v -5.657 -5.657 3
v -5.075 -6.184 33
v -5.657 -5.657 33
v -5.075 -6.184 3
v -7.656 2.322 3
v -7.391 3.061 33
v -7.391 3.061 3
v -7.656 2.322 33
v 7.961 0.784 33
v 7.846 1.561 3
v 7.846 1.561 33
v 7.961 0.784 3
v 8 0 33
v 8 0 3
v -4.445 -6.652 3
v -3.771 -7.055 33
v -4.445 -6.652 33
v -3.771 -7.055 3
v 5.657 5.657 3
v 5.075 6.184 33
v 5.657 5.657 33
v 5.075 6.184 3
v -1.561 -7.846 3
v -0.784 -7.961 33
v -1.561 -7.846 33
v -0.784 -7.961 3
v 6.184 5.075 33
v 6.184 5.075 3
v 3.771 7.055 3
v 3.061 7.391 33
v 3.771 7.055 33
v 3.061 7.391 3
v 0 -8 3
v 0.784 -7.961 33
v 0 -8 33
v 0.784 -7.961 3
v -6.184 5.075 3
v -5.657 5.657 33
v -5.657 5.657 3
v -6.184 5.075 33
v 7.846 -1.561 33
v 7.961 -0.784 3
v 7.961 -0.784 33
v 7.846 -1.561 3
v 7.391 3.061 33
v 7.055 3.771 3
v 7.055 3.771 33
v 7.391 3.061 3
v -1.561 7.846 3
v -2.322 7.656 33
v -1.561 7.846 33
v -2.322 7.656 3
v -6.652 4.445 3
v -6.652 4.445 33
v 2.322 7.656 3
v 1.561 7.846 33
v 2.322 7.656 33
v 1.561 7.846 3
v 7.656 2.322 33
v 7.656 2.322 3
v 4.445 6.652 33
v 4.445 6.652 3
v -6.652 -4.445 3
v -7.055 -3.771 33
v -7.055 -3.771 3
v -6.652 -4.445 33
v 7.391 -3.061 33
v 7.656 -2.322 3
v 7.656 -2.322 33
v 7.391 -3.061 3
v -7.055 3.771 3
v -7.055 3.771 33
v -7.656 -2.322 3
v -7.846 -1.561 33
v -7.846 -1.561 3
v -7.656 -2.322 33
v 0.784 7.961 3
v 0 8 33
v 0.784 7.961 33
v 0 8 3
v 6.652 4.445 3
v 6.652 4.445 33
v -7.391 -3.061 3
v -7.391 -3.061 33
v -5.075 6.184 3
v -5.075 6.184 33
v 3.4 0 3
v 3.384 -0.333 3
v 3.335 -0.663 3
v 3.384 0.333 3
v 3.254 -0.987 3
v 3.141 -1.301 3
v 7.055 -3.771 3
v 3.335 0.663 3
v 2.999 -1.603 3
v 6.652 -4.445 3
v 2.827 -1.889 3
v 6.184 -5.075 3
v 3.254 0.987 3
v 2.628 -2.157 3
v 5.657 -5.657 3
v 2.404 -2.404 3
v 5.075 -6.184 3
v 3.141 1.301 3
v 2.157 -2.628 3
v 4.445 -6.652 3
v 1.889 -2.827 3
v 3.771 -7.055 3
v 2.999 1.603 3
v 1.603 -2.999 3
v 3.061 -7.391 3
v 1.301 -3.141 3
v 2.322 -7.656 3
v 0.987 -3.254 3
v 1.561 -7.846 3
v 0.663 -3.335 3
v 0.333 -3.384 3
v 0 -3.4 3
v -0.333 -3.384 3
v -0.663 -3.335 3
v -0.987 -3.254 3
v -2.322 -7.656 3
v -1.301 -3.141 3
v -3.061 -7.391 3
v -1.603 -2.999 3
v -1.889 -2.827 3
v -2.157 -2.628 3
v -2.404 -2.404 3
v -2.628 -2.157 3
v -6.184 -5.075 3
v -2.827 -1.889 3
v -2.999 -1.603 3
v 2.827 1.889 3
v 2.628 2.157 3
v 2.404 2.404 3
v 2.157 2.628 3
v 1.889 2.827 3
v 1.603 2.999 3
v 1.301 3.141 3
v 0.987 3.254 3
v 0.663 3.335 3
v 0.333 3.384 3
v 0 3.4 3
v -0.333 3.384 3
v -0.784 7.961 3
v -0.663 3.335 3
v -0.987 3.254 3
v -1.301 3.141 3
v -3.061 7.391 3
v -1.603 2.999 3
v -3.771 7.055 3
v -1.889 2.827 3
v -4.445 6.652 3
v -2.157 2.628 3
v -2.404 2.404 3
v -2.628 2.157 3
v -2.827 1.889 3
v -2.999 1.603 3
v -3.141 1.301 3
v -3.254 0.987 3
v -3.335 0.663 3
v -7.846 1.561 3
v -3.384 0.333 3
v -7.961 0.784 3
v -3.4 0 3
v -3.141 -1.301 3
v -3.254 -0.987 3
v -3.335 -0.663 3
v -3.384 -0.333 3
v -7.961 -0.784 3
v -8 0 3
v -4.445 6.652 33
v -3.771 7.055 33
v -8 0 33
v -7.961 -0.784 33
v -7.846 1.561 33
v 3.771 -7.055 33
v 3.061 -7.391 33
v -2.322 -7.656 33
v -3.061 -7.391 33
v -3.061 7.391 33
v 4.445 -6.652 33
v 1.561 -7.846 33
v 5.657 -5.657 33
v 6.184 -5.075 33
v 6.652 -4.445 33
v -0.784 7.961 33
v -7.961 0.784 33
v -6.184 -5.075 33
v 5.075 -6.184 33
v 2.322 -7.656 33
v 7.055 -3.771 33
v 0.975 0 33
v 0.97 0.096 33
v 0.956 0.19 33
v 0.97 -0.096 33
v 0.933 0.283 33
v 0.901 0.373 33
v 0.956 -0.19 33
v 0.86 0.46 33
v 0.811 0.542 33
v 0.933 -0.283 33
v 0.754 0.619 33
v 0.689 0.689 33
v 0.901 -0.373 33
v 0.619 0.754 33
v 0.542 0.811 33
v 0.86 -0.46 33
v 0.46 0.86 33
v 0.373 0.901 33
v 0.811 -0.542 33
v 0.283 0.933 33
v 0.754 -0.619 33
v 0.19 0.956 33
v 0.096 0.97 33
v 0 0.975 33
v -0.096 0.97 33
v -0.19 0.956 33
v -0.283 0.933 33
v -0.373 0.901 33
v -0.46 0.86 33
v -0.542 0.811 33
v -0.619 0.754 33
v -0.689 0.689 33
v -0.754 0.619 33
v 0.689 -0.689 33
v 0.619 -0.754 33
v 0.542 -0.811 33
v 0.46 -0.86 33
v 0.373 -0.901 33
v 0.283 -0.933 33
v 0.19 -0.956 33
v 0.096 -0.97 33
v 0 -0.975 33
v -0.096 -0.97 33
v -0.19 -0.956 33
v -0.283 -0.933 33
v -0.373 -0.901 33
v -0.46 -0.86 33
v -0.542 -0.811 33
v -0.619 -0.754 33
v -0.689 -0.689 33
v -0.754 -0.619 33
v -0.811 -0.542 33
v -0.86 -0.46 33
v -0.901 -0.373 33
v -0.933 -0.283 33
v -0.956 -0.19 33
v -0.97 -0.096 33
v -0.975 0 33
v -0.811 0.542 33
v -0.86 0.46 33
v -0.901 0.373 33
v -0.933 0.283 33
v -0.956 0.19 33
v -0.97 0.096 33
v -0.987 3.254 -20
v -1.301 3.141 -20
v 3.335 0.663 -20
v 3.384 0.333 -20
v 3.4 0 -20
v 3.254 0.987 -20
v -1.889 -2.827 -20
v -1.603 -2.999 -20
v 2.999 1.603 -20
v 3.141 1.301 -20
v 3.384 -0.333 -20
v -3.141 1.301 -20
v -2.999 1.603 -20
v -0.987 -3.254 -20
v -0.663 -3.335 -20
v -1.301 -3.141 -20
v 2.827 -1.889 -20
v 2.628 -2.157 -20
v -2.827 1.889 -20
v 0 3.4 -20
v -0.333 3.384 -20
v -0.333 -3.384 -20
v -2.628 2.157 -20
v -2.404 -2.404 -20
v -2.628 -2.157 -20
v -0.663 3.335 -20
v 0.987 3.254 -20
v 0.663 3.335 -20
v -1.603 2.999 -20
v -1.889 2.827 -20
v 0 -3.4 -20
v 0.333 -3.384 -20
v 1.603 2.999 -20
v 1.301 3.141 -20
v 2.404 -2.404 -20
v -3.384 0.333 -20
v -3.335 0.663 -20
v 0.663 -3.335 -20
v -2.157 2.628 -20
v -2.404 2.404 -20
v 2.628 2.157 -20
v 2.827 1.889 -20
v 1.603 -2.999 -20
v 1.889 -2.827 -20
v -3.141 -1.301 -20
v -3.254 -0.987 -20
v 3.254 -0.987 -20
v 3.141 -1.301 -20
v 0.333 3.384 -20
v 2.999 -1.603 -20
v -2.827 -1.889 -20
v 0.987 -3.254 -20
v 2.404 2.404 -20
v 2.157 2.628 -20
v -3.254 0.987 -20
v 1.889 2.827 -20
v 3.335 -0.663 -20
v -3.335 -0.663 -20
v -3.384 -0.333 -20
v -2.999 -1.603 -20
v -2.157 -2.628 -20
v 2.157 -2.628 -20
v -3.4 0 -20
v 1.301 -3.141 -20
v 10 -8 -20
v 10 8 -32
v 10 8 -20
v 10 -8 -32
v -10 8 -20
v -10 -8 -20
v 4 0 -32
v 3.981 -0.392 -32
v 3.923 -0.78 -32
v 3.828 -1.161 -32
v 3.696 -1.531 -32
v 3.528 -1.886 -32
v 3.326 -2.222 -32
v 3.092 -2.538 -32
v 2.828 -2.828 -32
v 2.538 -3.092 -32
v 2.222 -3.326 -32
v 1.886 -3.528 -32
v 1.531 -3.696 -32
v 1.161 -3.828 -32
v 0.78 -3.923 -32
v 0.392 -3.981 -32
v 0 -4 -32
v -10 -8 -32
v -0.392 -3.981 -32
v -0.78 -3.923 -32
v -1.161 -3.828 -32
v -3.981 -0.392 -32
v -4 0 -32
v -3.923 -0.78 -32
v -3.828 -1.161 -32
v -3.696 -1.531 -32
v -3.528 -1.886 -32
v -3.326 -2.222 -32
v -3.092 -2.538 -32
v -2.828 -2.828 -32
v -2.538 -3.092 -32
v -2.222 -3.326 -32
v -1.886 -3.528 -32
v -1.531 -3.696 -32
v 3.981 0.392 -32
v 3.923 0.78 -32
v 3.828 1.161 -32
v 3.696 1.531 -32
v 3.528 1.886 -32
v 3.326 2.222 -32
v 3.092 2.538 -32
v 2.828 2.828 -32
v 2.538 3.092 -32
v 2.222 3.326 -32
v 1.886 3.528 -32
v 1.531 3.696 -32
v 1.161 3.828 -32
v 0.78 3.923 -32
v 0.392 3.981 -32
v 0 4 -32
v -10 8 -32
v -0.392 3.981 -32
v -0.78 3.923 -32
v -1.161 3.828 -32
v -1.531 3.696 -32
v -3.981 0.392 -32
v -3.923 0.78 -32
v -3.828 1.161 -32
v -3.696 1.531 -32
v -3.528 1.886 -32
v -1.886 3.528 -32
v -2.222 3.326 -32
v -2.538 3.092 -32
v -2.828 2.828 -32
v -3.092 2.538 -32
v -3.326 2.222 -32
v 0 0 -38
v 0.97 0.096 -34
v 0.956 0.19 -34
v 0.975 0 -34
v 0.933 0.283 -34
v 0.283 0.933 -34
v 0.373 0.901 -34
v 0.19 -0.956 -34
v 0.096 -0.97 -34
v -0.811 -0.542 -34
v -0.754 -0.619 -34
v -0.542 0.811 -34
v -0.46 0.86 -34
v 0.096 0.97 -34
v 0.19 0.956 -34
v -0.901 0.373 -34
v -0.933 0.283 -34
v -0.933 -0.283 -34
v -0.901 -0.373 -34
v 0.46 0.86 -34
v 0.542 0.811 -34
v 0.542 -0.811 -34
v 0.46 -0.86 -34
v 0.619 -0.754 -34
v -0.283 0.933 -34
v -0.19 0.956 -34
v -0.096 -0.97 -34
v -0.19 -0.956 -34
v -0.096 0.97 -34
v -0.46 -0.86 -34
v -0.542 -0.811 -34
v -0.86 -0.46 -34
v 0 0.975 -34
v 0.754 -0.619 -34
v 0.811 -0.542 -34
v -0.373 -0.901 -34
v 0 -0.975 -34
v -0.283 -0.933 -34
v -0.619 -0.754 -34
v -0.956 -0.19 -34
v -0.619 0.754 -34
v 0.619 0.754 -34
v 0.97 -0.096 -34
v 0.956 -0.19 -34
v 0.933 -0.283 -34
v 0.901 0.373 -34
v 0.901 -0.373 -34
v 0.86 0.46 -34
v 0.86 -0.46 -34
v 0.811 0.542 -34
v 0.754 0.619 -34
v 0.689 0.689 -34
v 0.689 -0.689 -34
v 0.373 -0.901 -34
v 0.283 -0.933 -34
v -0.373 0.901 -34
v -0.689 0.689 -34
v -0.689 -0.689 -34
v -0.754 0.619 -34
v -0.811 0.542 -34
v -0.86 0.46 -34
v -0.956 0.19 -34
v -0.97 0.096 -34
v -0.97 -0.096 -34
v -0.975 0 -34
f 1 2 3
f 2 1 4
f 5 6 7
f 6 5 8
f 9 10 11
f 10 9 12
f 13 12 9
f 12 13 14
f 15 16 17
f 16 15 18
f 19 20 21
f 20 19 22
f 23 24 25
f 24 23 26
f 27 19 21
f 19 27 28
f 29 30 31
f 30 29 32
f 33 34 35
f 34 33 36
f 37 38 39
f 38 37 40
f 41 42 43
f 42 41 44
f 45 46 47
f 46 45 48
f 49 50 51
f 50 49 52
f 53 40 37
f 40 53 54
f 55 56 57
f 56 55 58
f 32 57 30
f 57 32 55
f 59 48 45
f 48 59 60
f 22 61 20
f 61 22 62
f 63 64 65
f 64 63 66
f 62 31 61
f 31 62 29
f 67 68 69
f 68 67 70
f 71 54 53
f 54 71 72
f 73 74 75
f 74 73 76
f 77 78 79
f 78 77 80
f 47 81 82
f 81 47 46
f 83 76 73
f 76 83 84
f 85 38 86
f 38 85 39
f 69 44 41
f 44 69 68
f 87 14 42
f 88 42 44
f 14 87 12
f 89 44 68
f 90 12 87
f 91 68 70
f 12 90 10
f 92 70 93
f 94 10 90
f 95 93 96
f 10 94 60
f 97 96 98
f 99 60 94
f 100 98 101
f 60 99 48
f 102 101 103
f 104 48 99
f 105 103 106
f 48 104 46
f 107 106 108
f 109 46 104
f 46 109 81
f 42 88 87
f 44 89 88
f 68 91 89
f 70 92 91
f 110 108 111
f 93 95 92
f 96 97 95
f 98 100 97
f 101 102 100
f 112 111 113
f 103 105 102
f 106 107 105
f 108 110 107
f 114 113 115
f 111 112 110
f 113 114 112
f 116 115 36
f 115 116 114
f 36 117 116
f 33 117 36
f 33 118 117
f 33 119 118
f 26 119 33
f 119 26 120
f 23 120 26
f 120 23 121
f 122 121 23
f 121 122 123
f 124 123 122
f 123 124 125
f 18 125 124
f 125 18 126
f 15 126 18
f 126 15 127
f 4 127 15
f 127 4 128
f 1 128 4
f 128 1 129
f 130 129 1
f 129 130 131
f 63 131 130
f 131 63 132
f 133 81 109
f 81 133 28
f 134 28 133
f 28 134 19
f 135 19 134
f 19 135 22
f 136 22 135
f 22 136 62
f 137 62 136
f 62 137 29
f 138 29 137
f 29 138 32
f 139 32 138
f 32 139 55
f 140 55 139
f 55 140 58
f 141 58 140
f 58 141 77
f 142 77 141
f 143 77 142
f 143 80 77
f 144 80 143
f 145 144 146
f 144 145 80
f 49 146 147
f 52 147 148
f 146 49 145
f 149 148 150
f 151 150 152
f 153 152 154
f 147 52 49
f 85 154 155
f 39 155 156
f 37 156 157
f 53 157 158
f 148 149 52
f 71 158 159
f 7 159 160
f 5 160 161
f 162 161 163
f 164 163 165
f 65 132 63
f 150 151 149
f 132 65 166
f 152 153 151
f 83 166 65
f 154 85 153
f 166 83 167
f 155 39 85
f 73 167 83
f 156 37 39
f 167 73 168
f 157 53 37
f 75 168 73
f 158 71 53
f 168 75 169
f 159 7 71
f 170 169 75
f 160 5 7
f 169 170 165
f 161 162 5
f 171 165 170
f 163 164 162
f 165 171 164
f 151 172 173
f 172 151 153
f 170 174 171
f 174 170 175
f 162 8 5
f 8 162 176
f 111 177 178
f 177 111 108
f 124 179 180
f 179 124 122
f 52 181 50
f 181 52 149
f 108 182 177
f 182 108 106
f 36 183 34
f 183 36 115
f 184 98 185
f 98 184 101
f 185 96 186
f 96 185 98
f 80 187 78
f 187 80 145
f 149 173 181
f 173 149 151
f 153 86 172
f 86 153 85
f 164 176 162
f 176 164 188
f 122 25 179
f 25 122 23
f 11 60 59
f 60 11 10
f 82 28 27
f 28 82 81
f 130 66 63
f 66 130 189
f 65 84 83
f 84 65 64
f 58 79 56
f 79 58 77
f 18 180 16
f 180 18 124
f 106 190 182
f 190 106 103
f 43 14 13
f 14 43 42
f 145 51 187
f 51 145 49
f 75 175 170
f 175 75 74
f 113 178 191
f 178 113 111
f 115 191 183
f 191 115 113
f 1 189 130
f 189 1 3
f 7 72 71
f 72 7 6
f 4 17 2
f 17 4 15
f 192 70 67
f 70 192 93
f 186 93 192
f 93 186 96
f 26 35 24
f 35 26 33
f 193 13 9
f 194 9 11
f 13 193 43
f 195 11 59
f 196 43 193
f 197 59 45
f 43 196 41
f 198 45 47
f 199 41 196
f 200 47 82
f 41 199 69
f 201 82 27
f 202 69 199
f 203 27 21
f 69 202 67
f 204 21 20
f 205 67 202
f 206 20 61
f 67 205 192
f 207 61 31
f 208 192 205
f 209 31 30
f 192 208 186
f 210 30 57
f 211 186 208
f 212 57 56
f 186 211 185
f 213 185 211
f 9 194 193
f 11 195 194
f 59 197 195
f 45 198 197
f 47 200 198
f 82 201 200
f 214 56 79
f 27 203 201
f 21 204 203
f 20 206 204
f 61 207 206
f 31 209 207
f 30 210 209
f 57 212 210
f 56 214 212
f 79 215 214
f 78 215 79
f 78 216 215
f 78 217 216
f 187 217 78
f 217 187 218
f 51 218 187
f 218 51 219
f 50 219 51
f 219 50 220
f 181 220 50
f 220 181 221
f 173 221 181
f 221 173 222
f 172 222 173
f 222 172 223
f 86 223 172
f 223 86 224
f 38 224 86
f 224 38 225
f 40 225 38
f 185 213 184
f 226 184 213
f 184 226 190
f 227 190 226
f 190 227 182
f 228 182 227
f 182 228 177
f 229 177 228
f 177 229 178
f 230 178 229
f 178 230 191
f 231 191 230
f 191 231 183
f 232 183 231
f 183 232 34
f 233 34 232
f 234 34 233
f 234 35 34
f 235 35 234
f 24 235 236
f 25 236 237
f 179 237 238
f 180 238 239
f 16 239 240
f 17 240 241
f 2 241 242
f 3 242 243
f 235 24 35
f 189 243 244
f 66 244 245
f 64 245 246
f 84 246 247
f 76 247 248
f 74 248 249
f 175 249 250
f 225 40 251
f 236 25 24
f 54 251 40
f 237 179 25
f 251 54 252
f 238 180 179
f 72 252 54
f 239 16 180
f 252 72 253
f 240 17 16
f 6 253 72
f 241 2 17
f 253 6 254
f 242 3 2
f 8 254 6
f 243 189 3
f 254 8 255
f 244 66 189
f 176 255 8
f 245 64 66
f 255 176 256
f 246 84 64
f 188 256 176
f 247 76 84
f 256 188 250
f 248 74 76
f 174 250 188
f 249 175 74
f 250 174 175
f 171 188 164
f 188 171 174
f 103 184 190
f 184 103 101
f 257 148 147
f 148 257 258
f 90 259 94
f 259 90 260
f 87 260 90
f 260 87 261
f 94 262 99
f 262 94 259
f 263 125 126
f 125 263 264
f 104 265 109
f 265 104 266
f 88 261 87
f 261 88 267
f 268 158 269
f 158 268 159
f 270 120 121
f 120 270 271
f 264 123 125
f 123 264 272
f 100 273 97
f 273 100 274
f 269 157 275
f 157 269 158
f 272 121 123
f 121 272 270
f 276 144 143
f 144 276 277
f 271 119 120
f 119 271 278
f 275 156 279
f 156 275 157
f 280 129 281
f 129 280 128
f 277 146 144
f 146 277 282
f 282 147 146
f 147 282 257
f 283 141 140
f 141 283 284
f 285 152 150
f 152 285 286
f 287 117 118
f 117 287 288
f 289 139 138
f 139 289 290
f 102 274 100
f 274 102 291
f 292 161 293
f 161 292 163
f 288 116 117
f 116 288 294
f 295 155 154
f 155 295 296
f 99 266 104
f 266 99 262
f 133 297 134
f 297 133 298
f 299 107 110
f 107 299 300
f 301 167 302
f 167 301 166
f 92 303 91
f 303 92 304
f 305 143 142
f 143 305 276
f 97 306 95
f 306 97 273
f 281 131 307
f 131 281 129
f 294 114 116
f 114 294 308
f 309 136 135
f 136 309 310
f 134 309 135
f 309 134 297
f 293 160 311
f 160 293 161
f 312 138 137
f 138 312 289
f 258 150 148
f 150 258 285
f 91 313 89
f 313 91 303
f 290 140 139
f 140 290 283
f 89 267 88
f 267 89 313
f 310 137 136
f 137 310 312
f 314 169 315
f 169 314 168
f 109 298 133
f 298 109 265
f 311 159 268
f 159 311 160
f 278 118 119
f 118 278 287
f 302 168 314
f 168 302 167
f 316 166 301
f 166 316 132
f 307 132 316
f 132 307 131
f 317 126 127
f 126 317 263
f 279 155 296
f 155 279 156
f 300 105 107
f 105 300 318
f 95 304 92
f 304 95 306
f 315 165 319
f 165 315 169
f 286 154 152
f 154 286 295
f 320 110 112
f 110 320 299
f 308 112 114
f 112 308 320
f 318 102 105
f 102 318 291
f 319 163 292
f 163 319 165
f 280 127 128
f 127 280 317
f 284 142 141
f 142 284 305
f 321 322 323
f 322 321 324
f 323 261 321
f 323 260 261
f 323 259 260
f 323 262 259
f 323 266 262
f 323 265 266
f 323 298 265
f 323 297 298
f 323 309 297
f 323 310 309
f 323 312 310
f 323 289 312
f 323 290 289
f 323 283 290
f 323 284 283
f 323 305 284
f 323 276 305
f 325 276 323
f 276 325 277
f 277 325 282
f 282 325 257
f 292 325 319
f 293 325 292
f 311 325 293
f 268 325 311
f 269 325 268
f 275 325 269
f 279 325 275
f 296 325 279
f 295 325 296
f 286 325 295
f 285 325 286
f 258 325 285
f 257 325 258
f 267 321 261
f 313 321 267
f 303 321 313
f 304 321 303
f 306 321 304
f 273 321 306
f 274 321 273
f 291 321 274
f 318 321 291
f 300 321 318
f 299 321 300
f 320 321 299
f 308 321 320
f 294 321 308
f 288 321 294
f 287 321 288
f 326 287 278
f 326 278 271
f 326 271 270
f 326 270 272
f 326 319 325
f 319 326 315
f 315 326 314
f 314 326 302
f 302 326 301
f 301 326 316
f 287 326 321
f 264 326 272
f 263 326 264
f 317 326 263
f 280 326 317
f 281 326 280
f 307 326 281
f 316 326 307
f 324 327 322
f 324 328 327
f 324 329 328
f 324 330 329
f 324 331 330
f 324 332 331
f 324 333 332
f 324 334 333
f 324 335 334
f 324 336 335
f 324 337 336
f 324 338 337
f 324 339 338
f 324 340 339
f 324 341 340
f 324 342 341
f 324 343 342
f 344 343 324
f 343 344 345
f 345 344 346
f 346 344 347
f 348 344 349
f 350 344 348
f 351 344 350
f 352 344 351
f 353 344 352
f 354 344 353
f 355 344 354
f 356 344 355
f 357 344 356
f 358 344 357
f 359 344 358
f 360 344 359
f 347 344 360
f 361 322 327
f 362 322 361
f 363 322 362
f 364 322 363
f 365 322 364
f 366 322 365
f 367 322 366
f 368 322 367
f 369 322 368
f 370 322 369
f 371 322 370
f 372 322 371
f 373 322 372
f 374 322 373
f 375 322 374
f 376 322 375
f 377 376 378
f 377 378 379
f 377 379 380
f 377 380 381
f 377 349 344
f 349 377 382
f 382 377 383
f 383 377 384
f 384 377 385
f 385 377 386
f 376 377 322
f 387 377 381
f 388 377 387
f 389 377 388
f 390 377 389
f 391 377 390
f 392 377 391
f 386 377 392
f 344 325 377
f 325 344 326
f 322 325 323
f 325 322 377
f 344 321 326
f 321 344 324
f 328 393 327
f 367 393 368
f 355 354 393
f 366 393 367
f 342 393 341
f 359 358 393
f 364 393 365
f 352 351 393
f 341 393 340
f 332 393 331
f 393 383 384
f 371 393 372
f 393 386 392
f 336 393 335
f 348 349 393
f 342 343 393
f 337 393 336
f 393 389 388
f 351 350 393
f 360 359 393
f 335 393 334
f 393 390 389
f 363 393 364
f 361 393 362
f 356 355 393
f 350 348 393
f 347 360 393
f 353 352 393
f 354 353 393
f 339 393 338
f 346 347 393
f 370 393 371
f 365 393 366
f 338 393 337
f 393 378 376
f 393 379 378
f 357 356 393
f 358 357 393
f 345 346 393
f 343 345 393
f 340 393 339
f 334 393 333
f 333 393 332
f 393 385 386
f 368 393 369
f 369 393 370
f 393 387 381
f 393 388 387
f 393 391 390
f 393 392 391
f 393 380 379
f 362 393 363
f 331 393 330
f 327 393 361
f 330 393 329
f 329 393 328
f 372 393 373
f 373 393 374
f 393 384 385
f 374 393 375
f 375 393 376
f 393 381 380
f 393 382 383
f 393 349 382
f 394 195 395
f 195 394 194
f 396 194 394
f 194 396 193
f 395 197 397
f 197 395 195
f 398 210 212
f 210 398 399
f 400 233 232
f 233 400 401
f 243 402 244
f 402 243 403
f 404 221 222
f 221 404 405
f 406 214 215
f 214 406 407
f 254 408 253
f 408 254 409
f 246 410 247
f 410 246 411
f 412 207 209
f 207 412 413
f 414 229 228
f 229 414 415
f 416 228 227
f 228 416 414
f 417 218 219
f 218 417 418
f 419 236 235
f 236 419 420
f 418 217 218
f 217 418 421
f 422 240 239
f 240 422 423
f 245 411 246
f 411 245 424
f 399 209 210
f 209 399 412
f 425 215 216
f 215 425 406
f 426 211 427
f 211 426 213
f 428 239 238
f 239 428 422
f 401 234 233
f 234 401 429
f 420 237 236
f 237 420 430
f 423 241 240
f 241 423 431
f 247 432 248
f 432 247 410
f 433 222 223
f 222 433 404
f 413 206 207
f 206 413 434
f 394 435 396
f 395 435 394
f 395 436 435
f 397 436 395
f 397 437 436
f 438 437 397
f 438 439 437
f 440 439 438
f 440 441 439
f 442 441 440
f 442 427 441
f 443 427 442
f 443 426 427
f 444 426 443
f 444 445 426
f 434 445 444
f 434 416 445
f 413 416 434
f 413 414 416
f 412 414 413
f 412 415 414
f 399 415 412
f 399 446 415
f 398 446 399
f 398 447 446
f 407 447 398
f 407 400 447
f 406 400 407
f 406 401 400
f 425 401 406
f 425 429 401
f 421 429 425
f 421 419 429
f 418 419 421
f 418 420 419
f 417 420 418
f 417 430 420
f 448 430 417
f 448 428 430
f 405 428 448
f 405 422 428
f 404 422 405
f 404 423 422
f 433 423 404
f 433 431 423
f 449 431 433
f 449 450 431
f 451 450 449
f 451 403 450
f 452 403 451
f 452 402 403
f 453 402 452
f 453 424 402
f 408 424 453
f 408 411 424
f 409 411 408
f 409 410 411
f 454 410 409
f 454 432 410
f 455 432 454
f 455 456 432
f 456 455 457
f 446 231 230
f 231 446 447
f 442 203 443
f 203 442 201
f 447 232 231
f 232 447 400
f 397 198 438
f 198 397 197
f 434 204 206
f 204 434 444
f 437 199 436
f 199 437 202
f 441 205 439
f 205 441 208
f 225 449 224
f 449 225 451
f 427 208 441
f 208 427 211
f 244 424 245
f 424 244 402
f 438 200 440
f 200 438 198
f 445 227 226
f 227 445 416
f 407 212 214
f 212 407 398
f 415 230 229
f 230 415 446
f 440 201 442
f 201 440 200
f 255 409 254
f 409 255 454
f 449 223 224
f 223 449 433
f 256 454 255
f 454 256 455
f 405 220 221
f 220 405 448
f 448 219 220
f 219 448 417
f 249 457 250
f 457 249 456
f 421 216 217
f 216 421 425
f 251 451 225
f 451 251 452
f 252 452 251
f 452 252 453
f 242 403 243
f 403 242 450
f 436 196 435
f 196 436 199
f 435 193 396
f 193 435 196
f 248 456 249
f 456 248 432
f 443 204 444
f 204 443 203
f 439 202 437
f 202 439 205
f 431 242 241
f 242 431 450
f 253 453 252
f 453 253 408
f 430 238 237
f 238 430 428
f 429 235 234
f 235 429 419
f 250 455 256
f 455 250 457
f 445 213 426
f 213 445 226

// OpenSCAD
// Parameters
total_length_mm = 66; //[33:132:1]
barrel_diameter_mm = 6.8; //[3.4:13.6:0.1]
filament_diameter_mm = 1.75; //[1:3:0.05]
filament_clearance_mm = 0.2; //[0:0.6:0.05]
overlap_mm = 1; //[0.5:2:0.1]
insulator_diameter_mm = 16; //[8:32:0.5]
insulator_length_mm = 30; //[15:60:1]
heater_block_size_x_mm = 20; //[10:40:1]
heater_block_size_y_mm = 16; //[8:32:1]
heater_block_size_z_mm = 12; //[6:24:1]
nozzle_tip_length_mm = 6; //[3:12:0.5]
nozzle_tip_diameter_mm = 8; //[4:16:0.5]
barrel_length_mm = 36; //[18:72:1]

// Hot End - complete geometry
module hot_end() {
  color("DimGray") {
    // Insulator Body
    translate([0, 0, total_length_mm/2 - insulator_length_mm/2])
      cylinder(r=insulator_diameter_mm/2, h=insulator_length_mm, center=true, $fn=64);
    
    // Barrel
    translate([0, 0, -(total_length_mm/2 - (total_length_mm - insulator_length_mm + overlap_mm)/2) + overlap_mm/2])
      cylinder(r=barrel_diameter_mm/2, h=total_length_mm - insulator_length_mm + overlap_mm, center=true, $fn=64);
    
    // Heater Block Interface
    translate([0, 0, -total_length_mm/2 + heater_block_size_z_mm/2 + overlap_mm])
      cube([heater_block_size_x_mm, heater_block_size_y_mm, heater_block_size_z_mm], center=true);
    
    // Nozzle Tip
    translate([0, 0, -total_length_mm/2 - nozzle_tip_length_mm/2 + overlap_mm])
      rotate([180, 0, 0])
      cylinder(r1=nozzle_tip_diameter_mm/2, r2=0, h=nozzle_tip_length_mm, center=true, $fn=64);
  }
}

// Jhead Hot End - complete geometry
module jhead_hot_end() {
  color("Black") {
    // Reuse hot_end geometry for simplicity
    hot_end();
  }
}

// E3D Hot End Assembly - complete geometry
module e3d_hot_end_assembly() {
  color("Silver") {
    // Reuse hot_end geometry for simplicity
    hot_end();
  }
}

// Jhead Hot End Assembly - complete geometry
module jhead_hot_end_assembly() {
  color("Black") {
    // Reuse jhead_hot_end geometry for simplicity
    jhead_hot_end();
  }
}

// E3D Hot End - complete geometry
module e3d_hot_end() {
  color("Silver") {
    // Reuse hot_end geometry for simplicity
    hot_end();
  }
}

// Assembly
module assembly() {
  difference() {
    union() {
      hot_end();
      jhead_hot_end();
      e3d_hot_end_assembly();
      jhead_hot_end_assembly();
      e3d_hot_end();
    }
    // Filament Bore
    translate([0, 0, 0])
      cylinder(r=(filament_diameter_mm + filament_clearance_mm)/2, h=total_length_mm + 2*overlap_mm, center=true, $fn=64);
  }
}

assembly();
